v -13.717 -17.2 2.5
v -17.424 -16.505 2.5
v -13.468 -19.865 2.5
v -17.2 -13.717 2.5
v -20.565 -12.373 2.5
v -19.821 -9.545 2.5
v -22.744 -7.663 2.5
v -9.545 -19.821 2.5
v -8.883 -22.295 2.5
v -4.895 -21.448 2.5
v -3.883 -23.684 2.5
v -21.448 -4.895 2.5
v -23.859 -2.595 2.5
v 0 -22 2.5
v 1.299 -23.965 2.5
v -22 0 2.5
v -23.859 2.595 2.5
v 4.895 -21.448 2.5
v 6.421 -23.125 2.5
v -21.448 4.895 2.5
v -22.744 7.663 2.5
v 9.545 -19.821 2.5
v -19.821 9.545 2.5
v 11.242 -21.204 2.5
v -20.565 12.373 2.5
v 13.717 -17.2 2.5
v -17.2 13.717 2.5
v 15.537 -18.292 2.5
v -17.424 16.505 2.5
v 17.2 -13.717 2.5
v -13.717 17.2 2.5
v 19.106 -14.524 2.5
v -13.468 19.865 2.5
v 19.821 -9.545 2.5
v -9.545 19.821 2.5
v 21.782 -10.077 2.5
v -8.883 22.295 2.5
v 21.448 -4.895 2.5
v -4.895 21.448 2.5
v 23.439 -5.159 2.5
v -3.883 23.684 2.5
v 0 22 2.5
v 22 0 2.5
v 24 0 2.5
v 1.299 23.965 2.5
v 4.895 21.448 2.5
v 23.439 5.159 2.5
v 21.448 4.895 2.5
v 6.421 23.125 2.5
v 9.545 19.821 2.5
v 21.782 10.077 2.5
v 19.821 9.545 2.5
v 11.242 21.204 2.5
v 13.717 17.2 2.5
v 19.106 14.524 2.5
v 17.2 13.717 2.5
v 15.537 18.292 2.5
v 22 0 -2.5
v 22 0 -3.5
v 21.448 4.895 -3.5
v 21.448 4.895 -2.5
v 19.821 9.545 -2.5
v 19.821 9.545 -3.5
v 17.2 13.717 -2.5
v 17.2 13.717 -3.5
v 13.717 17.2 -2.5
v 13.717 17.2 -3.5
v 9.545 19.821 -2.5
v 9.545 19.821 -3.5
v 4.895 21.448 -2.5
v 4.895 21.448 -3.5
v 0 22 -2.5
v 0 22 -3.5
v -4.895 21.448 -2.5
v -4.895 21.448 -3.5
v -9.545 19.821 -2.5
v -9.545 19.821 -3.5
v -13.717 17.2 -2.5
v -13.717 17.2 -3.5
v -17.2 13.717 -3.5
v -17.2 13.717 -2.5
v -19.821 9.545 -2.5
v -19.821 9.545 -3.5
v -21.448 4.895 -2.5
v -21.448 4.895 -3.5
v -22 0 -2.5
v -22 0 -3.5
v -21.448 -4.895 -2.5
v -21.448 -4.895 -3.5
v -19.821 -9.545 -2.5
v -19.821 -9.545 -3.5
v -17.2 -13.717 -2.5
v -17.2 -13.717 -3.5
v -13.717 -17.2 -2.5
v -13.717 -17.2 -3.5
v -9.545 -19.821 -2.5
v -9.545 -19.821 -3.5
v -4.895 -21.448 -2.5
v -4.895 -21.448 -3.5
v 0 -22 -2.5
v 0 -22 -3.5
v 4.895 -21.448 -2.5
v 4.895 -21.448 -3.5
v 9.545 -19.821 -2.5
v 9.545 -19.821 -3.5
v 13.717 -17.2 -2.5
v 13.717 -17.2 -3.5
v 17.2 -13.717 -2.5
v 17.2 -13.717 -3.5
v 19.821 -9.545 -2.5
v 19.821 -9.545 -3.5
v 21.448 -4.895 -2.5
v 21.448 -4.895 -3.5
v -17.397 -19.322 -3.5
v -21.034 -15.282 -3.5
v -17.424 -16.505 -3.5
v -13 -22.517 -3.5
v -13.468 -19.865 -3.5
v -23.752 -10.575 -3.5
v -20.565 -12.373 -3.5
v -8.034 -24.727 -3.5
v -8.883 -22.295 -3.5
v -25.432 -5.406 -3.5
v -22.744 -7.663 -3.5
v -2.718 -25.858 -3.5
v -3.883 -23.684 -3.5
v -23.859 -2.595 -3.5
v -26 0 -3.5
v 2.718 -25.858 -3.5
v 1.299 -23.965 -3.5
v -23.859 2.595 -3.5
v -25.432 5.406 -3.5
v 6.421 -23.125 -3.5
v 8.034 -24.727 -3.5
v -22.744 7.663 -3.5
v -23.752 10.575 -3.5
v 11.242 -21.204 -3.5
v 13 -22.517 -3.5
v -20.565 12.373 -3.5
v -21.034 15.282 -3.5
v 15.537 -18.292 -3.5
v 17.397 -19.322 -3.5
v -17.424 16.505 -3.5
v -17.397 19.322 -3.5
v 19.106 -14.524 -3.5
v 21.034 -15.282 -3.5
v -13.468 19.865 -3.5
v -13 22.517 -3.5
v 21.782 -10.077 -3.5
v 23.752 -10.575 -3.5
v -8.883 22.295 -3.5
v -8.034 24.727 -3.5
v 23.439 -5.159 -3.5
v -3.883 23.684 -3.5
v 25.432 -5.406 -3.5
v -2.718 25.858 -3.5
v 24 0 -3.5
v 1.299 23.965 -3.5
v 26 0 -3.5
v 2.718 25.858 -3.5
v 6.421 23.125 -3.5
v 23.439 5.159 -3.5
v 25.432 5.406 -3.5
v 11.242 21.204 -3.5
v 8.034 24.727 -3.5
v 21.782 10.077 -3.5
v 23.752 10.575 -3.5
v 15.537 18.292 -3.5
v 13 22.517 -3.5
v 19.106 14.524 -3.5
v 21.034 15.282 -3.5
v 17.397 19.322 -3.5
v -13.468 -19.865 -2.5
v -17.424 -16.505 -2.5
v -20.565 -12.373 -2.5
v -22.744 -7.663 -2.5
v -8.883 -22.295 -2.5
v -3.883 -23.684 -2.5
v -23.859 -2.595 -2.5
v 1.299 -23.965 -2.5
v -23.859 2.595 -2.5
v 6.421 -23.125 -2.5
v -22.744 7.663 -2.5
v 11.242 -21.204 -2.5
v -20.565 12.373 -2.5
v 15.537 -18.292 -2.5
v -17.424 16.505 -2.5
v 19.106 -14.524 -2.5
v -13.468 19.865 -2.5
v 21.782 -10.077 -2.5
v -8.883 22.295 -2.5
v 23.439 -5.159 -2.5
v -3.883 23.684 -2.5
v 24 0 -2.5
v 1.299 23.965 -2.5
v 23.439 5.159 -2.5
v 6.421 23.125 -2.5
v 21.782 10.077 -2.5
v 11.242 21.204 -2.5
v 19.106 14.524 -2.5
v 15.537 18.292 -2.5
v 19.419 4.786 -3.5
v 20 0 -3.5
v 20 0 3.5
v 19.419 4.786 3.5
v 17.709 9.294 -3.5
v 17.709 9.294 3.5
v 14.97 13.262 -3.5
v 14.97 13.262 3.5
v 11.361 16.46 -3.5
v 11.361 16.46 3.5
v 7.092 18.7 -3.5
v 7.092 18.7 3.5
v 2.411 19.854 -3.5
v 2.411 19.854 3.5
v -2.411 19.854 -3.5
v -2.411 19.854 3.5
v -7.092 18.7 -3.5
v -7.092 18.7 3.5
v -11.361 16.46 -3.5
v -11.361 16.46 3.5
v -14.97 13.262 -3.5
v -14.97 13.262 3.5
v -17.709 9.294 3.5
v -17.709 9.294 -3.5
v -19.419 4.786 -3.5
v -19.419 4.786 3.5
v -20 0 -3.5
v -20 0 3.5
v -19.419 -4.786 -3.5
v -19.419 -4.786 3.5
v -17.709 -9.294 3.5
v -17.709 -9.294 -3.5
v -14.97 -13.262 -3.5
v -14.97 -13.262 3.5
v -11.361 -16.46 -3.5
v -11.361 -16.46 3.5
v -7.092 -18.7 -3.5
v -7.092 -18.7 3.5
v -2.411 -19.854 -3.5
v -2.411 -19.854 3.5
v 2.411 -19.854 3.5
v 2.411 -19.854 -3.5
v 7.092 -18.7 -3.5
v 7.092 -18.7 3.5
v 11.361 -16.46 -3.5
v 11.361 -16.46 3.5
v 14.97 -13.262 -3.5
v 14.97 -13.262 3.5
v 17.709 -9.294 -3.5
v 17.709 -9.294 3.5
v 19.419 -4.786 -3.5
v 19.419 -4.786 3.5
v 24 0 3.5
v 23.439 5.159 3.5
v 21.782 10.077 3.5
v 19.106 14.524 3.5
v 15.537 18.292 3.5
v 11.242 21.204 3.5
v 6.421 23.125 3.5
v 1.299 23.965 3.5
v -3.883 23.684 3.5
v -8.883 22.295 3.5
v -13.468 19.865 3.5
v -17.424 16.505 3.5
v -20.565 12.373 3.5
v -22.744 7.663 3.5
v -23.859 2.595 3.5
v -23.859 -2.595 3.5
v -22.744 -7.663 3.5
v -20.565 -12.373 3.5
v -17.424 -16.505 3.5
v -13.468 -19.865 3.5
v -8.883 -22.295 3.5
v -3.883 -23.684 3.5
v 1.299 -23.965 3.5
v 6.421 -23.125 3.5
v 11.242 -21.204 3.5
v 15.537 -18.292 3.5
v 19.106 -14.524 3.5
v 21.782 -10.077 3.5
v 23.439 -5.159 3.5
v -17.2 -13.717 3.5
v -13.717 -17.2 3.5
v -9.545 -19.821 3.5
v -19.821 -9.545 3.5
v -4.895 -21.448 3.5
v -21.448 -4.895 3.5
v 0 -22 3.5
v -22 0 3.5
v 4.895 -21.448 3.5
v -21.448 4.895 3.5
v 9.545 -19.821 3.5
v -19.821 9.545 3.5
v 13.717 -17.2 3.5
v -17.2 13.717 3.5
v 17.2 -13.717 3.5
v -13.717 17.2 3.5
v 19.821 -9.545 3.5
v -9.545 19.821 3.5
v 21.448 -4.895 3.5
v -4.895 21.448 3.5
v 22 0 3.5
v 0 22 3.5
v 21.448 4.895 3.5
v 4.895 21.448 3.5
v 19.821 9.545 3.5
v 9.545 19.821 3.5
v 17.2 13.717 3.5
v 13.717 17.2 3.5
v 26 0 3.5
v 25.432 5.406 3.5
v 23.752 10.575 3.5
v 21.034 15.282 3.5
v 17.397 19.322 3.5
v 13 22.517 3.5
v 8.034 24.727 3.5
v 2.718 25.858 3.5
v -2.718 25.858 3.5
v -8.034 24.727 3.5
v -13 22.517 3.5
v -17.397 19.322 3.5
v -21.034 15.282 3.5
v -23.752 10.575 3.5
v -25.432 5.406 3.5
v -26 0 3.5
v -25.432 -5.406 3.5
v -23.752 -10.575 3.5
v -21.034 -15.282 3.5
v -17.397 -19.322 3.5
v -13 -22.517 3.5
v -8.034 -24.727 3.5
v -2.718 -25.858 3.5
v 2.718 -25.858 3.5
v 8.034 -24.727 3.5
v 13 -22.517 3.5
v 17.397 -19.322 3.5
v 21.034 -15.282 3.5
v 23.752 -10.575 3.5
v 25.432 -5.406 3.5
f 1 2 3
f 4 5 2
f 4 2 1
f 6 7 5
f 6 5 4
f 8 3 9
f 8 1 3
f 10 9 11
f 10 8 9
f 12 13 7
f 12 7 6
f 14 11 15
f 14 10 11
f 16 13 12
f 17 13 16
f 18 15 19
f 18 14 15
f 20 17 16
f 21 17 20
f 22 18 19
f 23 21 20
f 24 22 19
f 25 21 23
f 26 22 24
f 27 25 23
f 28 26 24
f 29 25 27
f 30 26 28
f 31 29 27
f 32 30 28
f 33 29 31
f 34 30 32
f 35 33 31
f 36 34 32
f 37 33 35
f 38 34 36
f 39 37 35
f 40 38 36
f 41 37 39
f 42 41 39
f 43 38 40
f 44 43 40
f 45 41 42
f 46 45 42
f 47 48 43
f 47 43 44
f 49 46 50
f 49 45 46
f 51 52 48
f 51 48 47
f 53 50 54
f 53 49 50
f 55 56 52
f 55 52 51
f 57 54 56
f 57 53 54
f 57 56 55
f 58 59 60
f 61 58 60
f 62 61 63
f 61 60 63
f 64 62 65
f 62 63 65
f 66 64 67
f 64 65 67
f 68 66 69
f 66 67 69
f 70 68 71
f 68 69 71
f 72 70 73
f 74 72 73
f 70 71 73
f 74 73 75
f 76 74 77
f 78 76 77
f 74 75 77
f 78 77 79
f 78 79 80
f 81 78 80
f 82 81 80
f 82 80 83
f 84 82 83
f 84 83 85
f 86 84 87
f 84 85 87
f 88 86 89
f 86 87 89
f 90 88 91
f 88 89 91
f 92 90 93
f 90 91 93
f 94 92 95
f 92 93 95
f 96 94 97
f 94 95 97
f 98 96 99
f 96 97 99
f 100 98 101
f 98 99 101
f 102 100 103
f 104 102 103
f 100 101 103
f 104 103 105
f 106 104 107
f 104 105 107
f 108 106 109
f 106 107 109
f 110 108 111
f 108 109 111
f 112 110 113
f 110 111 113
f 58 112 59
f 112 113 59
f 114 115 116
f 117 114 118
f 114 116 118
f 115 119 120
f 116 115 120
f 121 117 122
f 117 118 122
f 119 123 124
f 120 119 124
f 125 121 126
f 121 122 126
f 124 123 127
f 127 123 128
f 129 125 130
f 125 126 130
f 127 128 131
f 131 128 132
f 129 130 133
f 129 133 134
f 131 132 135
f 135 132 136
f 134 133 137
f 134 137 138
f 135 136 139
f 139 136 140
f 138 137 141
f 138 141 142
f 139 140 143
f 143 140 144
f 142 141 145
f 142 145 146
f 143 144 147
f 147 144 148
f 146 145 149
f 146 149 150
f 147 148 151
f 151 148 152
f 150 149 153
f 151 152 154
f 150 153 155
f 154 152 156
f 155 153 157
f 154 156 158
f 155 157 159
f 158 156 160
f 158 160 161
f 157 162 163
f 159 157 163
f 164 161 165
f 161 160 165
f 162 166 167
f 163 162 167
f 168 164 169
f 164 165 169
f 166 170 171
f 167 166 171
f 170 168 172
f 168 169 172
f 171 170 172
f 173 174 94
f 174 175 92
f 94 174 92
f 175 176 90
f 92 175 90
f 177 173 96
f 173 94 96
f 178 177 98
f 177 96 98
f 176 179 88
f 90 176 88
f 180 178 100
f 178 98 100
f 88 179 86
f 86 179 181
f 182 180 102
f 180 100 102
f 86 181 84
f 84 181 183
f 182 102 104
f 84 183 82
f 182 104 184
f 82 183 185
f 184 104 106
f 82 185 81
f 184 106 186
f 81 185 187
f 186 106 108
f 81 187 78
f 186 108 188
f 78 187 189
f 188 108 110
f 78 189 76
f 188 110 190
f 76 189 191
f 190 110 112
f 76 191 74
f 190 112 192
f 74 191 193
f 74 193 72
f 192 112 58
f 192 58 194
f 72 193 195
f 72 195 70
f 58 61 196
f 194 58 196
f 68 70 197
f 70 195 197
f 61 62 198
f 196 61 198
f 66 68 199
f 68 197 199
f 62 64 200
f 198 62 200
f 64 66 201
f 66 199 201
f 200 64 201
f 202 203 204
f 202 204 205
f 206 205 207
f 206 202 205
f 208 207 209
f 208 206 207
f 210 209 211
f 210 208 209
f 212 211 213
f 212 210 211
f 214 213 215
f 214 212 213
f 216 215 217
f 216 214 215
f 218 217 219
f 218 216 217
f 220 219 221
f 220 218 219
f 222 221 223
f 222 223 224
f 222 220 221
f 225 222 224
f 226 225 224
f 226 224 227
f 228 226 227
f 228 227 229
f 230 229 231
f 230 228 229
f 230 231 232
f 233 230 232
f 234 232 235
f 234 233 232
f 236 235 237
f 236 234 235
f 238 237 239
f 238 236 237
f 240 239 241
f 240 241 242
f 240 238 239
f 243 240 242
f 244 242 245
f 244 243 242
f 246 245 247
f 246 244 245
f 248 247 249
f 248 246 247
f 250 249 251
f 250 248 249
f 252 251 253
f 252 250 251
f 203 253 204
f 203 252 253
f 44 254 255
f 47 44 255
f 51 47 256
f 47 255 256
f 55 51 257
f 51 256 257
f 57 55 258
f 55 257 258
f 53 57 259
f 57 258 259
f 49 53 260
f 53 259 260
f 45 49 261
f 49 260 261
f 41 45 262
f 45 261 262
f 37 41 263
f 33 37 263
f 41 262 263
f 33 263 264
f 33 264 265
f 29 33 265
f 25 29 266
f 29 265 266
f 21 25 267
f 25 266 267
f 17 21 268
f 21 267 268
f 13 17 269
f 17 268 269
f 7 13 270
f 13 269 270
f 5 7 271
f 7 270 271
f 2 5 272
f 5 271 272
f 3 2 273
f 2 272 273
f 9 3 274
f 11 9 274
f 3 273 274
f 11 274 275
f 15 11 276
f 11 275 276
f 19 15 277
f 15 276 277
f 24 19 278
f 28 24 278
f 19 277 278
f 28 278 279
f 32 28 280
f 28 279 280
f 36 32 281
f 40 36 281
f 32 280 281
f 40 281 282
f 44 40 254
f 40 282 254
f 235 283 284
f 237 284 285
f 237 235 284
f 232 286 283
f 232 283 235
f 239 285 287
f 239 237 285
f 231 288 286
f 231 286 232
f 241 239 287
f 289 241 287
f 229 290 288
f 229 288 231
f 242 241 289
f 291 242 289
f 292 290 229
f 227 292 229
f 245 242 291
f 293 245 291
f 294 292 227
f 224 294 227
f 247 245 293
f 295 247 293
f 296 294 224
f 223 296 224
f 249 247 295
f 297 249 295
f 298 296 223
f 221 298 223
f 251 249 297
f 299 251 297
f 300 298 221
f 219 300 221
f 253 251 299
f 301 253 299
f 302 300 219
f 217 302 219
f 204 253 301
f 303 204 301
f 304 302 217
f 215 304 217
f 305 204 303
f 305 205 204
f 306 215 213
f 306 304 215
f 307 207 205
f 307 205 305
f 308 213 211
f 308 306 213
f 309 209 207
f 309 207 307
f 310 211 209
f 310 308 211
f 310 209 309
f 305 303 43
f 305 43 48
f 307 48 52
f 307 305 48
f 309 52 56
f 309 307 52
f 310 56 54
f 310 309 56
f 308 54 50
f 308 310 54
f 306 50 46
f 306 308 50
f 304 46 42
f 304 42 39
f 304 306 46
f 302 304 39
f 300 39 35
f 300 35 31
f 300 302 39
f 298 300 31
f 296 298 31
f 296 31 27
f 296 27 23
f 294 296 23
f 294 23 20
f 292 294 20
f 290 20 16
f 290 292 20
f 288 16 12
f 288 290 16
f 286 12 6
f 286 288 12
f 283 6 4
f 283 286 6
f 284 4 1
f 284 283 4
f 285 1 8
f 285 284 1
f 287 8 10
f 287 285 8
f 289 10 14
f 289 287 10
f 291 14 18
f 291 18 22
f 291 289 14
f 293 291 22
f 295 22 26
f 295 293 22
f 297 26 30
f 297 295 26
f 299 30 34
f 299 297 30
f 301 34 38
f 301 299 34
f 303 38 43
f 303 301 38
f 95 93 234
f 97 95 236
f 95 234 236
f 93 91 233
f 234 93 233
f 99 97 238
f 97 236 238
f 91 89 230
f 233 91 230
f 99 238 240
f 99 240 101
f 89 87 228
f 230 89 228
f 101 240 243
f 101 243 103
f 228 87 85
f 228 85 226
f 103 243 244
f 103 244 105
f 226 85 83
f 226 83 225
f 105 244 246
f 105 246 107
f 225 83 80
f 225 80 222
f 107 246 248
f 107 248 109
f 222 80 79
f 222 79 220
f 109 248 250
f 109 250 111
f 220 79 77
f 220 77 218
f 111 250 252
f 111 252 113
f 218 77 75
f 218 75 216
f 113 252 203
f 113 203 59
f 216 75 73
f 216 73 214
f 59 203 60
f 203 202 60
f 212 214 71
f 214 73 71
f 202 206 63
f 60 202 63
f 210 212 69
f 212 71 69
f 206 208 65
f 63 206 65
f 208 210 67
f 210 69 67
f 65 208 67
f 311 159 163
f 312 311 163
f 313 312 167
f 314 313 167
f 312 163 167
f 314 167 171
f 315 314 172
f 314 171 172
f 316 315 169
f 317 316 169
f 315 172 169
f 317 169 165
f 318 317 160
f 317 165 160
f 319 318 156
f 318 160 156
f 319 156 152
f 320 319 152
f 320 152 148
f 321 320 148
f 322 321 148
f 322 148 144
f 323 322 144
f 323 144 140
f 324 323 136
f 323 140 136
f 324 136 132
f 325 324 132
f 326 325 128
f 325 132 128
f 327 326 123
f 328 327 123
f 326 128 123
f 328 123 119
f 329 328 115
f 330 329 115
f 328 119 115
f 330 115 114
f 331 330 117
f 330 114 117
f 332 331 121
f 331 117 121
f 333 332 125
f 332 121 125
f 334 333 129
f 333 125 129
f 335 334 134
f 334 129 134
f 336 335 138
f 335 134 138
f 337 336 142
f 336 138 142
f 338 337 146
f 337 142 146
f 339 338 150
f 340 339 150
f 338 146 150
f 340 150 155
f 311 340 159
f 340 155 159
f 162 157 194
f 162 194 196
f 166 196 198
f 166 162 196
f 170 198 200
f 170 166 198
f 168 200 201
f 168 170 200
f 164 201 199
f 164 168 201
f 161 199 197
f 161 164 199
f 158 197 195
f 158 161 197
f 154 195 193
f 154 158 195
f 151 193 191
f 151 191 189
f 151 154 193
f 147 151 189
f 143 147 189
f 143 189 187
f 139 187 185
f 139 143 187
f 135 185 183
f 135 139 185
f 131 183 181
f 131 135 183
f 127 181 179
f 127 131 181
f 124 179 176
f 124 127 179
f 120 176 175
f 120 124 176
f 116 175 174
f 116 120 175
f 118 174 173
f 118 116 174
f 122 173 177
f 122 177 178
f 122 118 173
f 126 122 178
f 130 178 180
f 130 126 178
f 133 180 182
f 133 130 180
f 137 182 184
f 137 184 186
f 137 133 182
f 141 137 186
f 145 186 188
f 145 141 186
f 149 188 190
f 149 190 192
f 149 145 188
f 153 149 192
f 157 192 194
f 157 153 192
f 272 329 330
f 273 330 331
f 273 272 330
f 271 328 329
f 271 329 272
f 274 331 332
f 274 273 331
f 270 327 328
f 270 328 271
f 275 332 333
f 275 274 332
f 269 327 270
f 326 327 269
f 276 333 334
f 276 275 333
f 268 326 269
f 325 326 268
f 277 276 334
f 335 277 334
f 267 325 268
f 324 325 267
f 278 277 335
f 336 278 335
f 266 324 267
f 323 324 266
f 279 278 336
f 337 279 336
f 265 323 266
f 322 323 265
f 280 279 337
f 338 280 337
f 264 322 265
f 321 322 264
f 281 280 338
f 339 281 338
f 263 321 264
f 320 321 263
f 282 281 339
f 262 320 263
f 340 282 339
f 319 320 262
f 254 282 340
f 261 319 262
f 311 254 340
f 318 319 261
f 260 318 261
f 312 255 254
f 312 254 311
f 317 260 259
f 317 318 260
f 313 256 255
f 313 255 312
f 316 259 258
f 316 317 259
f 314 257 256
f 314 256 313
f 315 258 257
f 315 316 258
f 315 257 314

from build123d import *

# Parameters (mm, degrees)
EXTRUDE_1_DEPTH      = 3.5
EXTRUDE_1_DEPTH_BACK = 3.5
SKETCH_1_R           = 26
SKETCH_1_R_2         = 20
SKETCH_2_R           = 24
SKETCH_2_R_2         = 22
CUT_EXTRUDE_1_DEPTH  = 1


with BuildPart() as part:
    # 草图1 → 拉伸1 (new, two sides: drawn at the far end of the back side and taken through both)
    with BuildSketch(Plane.XY.offset(-EXTRUDE_1_DEPTH_BACK)):
        Circle(SKETCH_1_R)
        Circle(SKETCH_1_R_2, mode=Mode.SUBTRACT)
    extrude(amount=EXTRUDE_1_DEPTH + EXTRUDE_1_DEPTH_BACK)

    # 草图2 → 切除-拉伸1 (cut)
    with BuildSketch(Plane.XY.offset(3.5)):
        Circle(SKETCH_2_R)
        Circle(SKETCH_2_R_2, mode=Mode.SUBTRACT)
    cut_extrude_1 = extrude(amount=-CUT_EXTRUDE_1_DEPTH, mode=Mode.SUBTRACT)

    # 镜向1: 切除-拉伸1 across plane
    add(cut_extrude_1.mirror(Plane.XY), mode=Mode.SUBTRACT)


solid = part.part
